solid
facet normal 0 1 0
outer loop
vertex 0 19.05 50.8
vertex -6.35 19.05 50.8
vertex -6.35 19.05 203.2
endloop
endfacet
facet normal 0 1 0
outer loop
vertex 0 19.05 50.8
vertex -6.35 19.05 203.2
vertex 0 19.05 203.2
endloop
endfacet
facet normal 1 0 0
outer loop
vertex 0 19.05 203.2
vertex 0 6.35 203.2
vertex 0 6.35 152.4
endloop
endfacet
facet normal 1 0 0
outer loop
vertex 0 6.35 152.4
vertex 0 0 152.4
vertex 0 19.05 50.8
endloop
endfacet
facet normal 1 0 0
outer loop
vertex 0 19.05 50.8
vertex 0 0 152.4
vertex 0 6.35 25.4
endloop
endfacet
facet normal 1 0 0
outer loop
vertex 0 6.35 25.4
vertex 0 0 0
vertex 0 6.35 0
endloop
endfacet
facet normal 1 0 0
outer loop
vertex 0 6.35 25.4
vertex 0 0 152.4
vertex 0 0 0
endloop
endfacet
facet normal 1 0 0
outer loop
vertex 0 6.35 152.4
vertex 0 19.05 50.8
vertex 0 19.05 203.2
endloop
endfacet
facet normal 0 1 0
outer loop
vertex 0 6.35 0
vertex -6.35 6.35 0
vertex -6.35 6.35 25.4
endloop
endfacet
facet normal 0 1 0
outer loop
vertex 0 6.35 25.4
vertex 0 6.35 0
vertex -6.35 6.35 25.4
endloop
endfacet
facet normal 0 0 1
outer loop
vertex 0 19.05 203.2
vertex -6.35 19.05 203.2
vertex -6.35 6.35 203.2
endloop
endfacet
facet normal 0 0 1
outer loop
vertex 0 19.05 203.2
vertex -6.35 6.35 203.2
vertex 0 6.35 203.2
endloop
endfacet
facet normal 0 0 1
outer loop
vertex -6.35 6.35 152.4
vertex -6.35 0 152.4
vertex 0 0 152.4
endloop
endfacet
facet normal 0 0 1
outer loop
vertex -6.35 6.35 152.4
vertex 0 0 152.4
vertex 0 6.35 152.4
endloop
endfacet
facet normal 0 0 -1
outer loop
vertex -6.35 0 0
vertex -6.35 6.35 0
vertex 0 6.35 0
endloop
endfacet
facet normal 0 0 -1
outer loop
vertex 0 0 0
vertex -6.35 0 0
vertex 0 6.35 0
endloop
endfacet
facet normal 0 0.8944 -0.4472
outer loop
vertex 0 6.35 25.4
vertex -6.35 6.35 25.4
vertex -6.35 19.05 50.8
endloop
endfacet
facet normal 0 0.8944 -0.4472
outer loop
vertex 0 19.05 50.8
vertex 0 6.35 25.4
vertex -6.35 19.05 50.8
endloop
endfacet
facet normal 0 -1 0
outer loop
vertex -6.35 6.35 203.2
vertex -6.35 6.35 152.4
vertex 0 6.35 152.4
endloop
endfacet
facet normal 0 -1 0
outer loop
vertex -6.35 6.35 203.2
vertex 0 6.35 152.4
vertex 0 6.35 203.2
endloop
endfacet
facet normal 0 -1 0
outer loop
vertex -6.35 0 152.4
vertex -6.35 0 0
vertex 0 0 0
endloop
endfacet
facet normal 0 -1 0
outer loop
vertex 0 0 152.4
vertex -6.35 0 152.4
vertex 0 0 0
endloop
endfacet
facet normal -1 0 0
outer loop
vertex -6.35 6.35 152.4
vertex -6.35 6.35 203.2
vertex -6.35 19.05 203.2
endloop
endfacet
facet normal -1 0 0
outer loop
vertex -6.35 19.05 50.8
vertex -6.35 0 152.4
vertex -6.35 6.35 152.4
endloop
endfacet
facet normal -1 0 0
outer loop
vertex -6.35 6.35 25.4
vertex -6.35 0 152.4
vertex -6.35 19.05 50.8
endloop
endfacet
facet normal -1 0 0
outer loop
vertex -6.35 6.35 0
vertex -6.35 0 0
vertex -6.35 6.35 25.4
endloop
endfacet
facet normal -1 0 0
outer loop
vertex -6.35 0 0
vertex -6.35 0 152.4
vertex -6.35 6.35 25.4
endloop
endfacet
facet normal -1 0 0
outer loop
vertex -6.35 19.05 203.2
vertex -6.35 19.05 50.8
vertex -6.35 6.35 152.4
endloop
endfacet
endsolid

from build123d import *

# Parameters (mm, degrees)
SKETCH1_W           = 6.35
SKETCH1_H           = 19.05
BOSS_EXTRUDE1_DEPTH = 203.2
SKETCH2_W           = 50.8
SKETCH2_H           = 6.35
CUT_EXTRUDE1_DEPTH  = 203.2
CUT_EXTRUDE2_DEPTH  = 203.2


with BuildPart() as part:
    # Sketch1 → Boss-Extrude1 (new body)
    with BuildSketch(Plane.XY):
        with Locations((-3.175, 9.525)):
            Rectangle(SKETCH1_W, SKETCH1_H)
    extrude(amount=BOSS_EXTRUDE1_DEPTH)

    # Sketch2 → Cut-Extrude1 (cut)
    with BuildSketch(Plane.ZY.offset(6.35)):
        with Locations((177.8, 3.175)):
            Rectangle(SKETCH2_W, SKETCH2_H)
    extrude(amount=-CUT_EXTRUDE1_DEPTH, mode=Mode.SUBTRACT)

    # Sketch3 → Cut-Extrude2 (cut)
    with BuildSketch(Plane.ZY.offset(6.35)):
        Polygon((0, 6.35), (25.4, 6.35), (50.8, 19.05), (0, 19.05), align=None)
    extrude(amount=-CUT_EXTRUDE2_DEPTH, mode=Mode.SUBTRACT)


solid = part.part
